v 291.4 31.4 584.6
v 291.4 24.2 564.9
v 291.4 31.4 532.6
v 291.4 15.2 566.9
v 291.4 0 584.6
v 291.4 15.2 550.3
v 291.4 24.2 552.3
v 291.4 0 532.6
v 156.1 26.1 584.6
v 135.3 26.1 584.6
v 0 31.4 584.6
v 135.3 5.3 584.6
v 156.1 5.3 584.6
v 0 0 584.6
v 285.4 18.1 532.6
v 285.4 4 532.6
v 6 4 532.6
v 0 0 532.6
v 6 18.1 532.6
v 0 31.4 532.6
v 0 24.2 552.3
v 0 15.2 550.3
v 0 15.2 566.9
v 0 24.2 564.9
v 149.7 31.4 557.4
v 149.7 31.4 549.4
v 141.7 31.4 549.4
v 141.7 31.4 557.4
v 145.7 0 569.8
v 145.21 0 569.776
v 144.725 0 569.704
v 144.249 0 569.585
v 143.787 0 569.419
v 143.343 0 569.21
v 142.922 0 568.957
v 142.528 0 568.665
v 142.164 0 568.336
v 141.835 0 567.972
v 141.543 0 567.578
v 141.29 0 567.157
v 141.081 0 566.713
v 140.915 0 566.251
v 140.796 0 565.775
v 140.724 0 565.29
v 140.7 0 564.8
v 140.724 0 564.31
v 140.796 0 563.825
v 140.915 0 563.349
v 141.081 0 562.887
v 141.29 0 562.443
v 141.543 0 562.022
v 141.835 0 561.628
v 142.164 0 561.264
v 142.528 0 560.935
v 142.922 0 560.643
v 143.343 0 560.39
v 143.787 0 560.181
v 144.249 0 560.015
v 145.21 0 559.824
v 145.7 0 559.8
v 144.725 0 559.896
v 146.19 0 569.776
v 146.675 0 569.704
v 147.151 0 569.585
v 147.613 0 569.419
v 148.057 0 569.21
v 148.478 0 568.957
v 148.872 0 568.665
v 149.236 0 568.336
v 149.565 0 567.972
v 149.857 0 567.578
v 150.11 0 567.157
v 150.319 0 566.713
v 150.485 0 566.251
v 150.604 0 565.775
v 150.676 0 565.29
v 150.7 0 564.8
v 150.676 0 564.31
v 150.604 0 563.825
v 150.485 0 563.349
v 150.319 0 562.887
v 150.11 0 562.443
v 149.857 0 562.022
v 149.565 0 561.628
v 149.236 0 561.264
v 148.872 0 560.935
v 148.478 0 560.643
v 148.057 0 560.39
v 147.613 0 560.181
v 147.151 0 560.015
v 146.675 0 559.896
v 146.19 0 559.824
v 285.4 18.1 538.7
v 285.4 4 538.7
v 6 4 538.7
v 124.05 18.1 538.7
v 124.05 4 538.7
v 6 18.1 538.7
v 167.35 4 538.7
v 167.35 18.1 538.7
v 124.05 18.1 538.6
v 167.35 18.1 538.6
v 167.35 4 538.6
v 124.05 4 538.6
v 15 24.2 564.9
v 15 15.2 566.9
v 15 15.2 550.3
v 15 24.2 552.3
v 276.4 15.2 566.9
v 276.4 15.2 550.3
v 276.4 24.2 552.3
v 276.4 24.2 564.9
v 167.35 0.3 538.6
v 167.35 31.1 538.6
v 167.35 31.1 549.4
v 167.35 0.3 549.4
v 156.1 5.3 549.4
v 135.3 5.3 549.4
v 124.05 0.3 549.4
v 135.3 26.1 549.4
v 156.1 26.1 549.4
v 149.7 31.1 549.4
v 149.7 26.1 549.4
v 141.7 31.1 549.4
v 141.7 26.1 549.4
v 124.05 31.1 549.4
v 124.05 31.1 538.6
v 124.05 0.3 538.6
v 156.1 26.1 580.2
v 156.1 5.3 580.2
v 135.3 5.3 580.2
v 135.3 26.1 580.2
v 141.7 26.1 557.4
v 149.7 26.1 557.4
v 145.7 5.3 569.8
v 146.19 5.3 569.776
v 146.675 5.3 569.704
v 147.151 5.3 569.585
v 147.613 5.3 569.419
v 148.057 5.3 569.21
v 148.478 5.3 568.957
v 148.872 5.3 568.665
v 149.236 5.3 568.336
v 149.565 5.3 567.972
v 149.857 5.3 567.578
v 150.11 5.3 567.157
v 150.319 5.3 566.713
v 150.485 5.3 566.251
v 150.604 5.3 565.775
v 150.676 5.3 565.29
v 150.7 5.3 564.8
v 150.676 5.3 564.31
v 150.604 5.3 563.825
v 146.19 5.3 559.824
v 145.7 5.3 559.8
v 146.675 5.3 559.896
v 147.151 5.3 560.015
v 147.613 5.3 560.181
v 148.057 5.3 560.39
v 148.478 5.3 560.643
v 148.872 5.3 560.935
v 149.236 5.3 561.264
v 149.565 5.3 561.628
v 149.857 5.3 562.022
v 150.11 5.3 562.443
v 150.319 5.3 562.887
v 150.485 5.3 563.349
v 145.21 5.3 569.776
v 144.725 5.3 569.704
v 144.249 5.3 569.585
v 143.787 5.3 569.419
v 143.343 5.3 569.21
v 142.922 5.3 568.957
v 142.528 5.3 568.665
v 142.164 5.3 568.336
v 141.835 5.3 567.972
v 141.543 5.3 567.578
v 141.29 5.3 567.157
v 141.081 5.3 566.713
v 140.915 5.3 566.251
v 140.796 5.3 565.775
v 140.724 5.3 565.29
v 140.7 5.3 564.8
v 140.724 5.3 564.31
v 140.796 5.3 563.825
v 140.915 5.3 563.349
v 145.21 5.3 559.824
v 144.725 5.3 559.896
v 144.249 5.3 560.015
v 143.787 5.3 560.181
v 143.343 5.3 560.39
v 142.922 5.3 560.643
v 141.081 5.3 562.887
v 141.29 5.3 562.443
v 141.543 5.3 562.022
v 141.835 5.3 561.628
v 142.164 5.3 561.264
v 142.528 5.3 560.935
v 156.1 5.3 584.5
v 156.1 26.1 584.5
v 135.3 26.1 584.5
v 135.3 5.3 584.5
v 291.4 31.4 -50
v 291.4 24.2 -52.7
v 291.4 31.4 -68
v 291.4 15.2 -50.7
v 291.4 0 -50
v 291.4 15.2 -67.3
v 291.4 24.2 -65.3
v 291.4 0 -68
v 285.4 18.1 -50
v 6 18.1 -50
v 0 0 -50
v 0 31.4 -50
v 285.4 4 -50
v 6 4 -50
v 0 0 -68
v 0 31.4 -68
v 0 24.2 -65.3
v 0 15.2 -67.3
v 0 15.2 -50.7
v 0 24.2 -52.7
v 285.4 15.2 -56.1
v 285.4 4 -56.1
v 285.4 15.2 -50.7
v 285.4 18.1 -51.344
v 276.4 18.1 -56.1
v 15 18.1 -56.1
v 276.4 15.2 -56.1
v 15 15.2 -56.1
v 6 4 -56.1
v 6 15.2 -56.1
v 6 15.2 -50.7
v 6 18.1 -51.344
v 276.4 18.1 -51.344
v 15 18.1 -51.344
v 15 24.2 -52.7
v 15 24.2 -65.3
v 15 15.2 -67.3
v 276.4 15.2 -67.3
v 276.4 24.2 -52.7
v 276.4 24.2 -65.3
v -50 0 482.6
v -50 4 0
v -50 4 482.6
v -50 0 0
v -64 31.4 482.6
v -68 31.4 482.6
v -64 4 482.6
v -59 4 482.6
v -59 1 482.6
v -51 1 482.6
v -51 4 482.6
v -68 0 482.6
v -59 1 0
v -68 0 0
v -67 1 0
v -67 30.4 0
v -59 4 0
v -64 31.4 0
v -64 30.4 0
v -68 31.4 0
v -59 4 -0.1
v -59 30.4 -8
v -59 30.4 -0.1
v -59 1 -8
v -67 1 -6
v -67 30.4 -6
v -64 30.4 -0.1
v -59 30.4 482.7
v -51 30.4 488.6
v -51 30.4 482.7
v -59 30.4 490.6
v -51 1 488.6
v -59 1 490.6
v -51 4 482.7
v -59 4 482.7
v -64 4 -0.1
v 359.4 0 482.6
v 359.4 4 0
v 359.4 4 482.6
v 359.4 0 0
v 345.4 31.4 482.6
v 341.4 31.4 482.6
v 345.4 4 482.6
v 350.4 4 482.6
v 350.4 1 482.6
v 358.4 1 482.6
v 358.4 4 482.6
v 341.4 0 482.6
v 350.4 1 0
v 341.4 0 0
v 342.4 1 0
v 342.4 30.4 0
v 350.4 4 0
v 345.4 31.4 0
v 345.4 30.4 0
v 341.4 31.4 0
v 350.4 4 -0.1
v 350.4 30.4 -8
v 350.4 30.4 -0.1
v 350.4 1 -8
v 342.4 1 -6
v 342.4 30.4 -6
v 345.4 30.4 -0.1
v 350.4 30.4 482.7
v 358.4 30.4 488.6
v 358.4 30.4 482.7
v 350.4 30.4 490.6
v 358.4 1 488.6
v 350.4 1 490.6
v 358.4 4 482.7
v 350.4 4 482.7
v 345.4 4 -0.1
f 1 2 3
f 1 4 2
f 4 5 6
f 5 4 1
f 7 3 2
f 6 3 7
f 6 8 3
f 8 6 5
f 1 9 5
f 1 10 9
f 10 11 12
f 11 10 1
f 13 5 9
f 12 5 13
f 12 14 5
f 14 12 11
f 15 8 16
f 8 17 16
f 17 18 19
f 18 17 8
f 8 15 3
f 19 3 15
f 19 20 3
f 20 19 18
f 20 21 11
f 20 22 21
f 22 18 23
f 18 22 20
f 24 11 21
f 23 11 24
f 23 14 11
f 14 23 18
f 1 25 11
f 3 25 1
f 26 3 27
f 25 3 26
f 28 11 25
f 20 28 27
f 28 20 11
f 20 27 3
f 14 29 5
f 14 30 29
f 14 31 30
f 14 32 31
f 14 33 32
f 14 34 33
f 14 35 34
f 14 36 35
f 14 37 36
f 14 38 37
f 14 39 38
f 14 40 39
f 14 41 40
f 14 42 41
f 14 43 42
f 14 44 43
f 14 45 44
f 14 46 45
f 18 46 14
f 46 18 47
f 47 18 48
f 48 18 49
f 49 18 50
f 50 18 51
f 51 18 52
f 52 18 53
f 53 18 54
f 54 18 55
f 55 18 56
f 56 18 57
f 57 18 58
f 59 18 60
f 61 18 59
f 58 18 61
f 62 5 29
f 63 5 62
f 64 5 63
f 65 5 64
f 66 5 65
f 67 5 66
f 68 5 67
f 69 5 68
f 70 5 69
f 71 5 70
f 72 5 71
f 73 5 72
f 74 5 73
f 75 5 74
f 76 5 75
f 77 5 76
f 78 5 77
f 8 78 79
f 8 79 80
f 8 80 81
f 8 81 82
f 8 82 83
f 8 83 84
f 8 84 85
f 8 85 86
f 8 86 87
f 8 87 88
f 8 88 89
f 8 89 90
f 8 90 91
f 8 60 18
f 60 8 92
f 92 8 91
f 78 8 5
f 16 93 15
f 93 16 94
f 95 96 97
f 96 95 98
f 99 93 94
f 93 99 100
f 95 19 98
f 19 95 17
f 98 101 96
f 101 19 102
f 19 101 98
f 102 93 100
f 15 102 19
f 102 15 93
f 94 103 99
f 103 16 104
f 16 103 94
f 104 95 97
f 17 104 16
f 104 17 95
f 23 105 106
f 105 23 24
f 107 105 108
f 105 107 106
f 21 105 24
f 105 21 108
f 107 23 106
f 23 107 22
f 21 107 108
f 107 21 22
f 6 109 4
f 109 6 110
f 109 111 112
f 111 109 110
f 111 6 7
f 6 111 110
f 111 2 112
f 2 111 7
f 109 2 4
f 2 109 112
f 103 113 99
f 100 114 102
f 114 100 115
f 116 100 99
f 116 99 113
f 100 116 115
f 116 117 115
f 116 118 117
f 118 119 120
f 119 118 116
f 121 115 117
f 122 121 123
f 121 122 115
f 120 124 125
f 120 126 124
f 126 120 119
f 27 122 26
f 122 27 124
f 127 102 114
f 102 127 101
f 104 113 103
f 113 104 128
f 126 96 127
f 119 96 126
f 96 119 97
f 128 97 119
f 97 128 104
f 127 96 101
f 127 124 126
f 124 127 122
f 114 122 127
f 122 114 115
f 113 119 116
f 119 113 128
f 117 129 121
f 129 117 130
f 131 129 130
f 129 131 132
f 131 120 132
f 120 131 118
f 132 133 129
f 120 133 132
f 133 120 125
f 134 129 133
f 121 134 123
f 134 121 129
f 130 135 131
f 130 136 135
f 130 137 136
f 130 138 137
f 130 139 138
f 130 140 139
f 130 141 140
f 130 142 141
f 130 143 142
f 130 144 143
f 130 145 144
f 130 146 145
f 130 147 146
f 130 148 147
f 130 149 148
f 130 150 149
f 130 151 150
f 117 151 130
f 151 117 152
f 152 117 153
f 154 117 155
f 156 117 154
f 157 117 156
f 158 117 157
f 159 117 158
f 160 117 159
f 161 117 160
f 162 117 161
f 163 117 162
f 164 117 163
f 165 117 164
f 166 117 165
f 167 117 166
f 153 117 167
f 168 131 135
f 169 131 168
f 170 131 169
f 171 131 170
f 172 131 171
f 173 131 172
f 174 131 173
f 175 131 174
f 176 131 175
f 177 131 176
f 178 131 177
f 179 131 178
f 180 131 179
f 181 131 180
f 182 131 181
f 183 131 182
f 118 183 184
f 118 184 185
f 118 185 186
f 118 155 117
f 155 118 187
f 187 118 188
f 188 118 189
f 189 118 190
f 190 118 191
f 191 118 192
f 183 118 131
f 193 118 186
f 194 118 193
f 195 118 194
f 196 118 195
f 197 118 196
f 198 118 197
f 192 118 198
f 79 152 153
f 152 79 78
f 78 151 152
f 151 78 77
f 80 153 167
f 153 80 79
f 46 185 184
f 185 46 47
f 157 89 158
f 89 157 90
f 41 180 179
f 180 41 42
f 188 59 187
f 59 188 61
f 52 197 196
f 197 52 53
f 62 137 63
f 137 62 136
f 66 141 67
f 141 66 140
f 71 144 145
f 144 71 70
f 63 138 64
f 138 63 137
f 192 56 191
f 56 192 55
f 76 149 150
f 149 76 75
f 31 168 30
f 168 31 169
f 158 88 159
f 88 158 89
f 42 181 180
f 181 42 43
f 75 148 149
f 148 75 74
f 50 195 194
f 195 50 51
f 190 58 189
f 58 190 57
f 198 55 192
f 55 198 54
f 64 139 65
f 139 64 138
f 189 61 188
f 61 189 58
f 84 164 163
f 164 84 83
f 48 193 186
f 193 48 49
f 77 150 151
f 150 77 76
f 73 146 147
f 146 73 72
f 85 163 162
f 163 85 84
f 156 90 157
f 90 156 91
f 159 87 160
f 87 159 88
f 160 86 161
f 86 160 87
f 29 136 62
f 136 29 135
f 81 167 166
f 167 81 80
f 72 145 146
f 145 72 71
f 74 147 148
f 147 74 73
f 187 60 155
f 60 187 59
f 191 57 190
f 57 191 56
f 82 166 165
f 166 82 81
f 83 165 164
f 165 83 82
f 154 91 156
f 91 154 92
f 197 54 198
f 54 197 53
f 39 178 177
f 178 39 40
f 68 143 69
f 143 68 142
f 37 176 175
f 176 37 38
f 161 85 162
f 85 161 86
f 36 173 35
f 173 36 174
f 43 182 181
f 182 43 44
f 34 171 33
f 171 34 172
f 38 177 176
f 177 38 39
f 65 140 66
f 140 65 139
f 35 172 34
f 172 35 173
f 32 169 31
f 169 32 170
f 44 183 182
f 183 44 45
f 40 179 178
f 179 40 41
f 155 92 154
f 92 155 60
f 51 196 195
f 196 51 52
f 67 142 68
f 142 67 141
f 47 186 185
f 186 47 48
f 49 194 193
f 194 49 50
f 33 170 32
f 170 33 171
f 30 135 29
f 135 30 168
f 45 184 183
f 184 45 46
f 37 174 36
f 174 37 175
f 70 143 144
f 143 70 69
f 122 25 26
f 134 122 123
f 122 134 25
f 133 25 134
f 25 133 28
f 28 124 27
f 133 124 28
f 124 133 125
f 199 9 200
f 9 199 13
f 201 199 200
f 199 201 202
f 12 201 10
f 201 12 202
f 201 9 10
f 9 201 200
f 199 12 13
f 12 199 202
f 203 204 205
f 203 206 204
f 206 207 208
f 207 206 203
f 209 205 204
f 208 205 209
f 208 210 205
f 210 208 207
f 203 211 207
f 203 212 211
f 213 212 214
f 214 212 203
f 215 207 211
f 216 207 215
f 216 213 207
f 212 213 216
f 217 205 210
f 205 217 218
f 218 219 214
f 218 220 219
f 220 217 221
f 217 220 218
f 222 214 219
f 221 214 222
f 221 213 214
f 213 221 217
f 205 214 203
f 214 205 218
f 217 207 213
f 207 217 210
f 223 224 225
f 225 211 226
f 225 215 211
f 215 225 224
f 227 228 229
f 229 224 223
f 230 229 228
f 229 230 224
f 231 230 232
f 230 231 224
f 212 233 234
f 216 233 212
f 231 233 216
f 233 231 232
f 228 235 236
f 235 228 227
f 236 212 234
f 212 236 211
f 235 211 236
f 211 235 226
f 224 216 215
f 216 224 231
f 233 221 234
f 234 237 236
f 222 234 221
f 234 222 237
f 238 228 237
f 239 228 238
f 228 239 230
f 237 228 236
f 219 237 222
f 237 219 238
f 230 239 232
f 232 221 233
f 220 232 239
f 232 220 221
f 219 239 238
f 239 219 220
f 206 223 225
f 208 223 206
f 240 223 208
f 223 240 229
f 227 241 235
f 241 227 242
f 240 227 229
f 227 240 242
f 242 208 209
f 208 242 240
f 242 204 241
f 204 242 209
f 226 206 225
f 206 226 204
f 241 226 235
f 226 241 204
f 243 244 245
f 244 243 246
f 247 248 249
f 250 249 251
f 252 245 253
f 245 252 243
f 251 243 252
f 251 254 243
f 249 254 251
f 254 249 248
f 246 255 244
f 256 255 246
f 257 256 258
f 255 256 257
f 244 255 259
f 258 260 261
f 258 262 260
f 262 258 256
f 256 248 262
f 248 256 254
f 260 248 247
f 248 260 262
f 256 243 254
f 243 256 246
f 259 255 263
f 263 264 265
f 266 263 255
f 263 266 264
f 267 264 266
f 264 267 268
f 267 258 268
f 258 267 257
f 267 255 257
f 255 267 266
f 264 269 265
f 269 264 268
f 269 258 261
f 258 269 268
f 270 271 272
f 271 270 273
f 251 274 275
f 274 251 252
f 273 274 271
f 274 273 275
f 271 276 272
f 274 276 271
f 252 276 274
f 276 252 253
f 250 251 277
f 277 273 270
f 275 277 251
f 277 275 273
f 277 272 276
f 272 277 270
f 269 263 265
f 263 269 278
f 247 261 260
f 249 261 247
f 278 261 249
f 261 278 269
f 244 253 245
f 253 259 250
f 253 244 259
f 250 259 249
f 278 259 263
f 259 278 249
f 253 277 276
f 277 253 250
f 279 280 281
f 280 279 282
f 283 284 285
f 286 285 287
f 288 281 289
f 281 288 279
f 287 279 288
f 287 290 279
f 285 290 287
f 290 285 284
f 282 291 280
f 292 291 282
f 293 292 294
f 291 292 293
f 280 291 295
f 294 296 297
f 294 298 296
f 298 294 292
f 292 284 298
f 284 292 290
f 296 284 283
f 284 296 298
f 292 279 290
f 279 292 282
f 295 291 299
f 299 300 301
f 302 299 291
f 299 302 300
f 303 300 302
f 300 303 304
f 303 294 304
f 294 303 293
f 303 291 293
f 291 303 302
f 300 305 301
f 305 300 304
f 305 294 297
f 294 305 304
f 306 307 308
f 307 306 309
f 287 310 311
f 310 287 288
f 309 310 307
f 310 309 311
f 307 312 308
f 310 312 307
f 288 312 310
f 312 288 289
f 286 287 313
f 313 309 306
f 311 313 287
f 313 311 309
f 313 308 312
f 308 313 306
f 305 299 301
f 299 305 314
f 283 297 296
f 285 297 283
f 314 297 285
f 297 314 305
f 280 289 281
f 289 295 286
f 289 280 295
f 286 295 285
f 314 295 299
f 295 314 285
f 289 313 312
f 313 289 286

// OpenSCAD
// ============================================================
//  SMART MIRROR FRAME  –  4-piece snap-together  (PORTRAIT)
//
//  Monitor physical size : 19" x 11" x 1"
//    → 482.6 mm tall  (MON_H, vertical / long side)
//    → 279.4 mm wide  (MON_W, horizontal / short side)
//    → 25.4  mm deep  (MON_D)
//
//  Portrait orientation:
//    TOP  & BOTTOM rails  = SHORT  (span the 279.4 mm width)
//    LEFT & RIGHT  rails  = TALL   (span the 482.6 mm height)
//    Corner joints: TALL side rails carry TABS,
//                   SHORT top/bottom rails carry SOCKETS.
//
//  Camera : Logitech 101  (fully embedded in short top rail)
//    stand  : 42.5 x 30 x 10 mm
//    body   : 20  x 20 x 30 mm  (lens faces mirror front / -Y)
//
//  PARTS  →  set PART below, then render / export each STL:
//    "top"    short top rail  (embedded camera, lens port, cable exit)
//    "bottom" short bottom rail
//    "left"   tall left rail
//    "right"  tall right rail  (identical to left, print 2)
//    "all"    exploded view
// ============================================================

PART = "all";   // ← change to "top" / "bottom" / "left" / "right"

// ----------------------------------------------------------
//  MONITOR DIMENSIONS
// ----------------------------------------------------------
MON_W = 279.4;   // short side – width  (X)
MON_H = 482.6;   // long  side – height (Y / portrait axis)
MON_D =  25.4;   // depth (Z)

// ----------------------------------------------------------
//  FRAME PROFILE  (same cross-section on all four rails)
// ----------------------------------------------------------
WALL   = 6;            // outer wall / skin thickness
LIP    = 8;            // rear flange depth that tucks behind monitor
REVEAL = 4;            // front bezel overlap over monitor face
DEPTH  = MON_D + WALL; // full channel depth ≈ 31.4 mm

// ----------------------------------------------------------
//  DOVETAIL SNAP JOINT GEOMETRY
// ----------------------------------------------------------
TAB_W  = 16;           // base width of dovetail
TAB_H  =  8;           // protrusion length
TAB_T  = DEPTH - 2;    // thickness (nearly full depth)
DRAFT  =  2;           // taper on each side
CLEAR  =  0.3;         // fit clearance (tighten to 0.2 for resin)

// ----------------------------------------------------------
//  CAMERA DIMENSIONS  (Logitech 101)
// ----------------------------------------------------------
CAM_SL  = 42.5;   // stand length (X)
CAM_SW  = 30.0;   // stand width  (Y, front-to-back)
CAM_SH  = 10.0;   // stand height (Z)

CAM_BL  = 20.0;   // body length  (X)
CAM_BW  = 20.0;   // body width   (Y)
CAM_BH  = 30.0;   // body height  (Z)

CAM_CLR =  0.4;   // cavity clearance on all faces
LENS_D  = 10.0;   // lens port diameter
CABLE_W =  8.0;   // USB cable channel width

// Top rail Z-height must accommodate camera stack + wall skins
CAM_STACK  = CAM_SH + CAM_BH;          // 40 mm
TOP_RAIL_H = CAM_STACK + 2*WALL;       // 52 mm

// Normal short-rail height (bottom rail uses this)
SHORT_H    = WALL + LIP + REVEAL;      // 18 mm

// ============================================================
//  dovetail_tab()
//  Positive shape. Protrusion points in +X at call site;
//  caller rotates as needed.
// ============================================================
module dovetail_tab() {
    linear_extrude(TAB_T, center=true)
    polygon([
        [ 0,       -(TAB_W/2)        ],
        [ 0,        (TAB_W/2)        ],
        [ TAB_H,    (TAB_W/2 - DRAFT)],
        [ TAB_H,   -(TAB_W/2 - DRAFT)]
    ]);
}

// ============================================================
//  dovetail_socket()
//  Negative shape (subtract). Same profile + CLEAR.
// ============================================================
module dovetail_socket() {
    c = CLEAR;
    linear_extrude(TAB_T + 2*c, center=true)
    polygon([
        [-0.5,      -(TAB_W/2 + c)        ],
        [-0.5,       (TAB_W/2 + c)        ],
        [ TAB_H+0.5, (TAB_W/2 - DRAFT + c)],
        [ TAB_H+0.5,-(TAB_W/2 - DRAFT + c)]
    ]);
}

// ============================================================
//  TOP RAIL  (short, camera embedded)
//
//  Axes in this module:
//    X  = rail length  (0 … MON_W + 2*WALL)
//    Y  = front-to-back (0 = mirror front face)
//    Z  = rail height   (0 = inner bottom edge, TOP_RAIL_H = top)
//
//  - Monitor slot opens on bottom face (Z≈0), full X width
//  - Dovetail SOCKETS at each X end  (tab from side rail slides in)
//  - Camera stand cavity at Z=WALL (just above inner bottom skin)
//  - Camera body cavity stacked above stand cavity
//  - Lens port Ø LENS_D punched through front face (Y=0)
//  - Cable channel exits rear face (Y=DEPTH)
//  - Top-face access slot so camera can be dropped in during build
// ============================================================
module top_rail() {
    L = MON_W + 2*WALL;   // 291.4 mm

    // Camera X centre (centred in rail)
    cx = L / 2;

    // Stand cavity
    sx0 = cx - (CAM_SL + 2*CAM_CLR) / 2;
    sy0 = (DEPTH - (CAM_SW + 2*CAM_CLR)) / 2;
    sz0 = WALL;

    // Body cavity (centred on stand in X and Y, sits on top of stand)
    bx0 = cx - (CAM_BL + 2*CAM_CLR) / 2;
    by0 = (DEPTH - (CAM_BW + 2*CAM_CLR)) / 2;
    bz0 = sz0 + CAM_SH + 2*CAM_CLR;

    // Lens port Z centre (mid-height of body cavity)
    lens_z = bz0 + (CAM_BH + 2*CAM_CLR) / 2;

    difference() {
        // ---- solid rail block ----
        cube([L, DEPTH, TOP_RAIL_H]);

        // ---- monitor slot – bottom face ----
        translate([WALL, REVEAL, -0.1])
        cube([MON_W, LIP + WALL + 0.1, WALL + 0.2]);

        // ---- dovetail socket – left end (X=0, opens in -X) ----
        translate([0, DEPTH/2, TOP_RAIL_H/2])
        rotate([0, 90, 0])   // protrusion now points in -X (into socket opening)
        rotate([0,  0, 90])
        dovetail_socket();

        // ---- dovetail socket – right end (X=L, opens in +X) ----
        translate([L, DEPTH/2, TOP_RAIL_H/2])
        rotate([0, -90, 0])
        rotate([0,   0, 90])
        dovetail_socket();

        // ---- stand cavity ----
        translate([sx0, sy0, sz0])
        cube([CAM_SL + 2*CAM_CLR,
              CAM_SW + 2*CAM_CLR,
              CAM_SH + 2*CAM_CLR]);

        // ---- body cavity ----
        translate([bx0, by0, bz0])
        cube([CAM_BL + 2*CAM_CLR,
              CAM_BW + 2*CAM_CLR,
              CAM_BH + 2*CAM_CLR]);

        // ---- lens port (through front face Y=0) ----
        translate([cx, -0.1, lens_z])
        rotate([-90, 0, 0])
        cylinder(h = WALL + 1, r = LENS_D/2, $fn = 64);

        // ---- cable channel (exits rear face Y=DEPTH) ----
        translate([(L - CABLE_W)/2, DEPTH - WALL - 0.1, bz0])
        cube([CABLE_W, WALL + 0.2, CABLE_W]);

        // ---- top access slot for drop-in camera assembly ----
        translate([bx0, by0, TOP_RAIL_H - 0.1])
        cube([CAM_BL + 2*CAM_CLR,
              CAM_BW + 2*CAM_CLR,
              WALL + 0.2]);
    }
}

// ============================================================
//  BOTTOM RAIL  (short, no camera)
//
//  Same X/Y layout as top rail; shorter Z (SHORT_H = 18 mm).
//  Monitor slot opens on TOP face (Z = SHORT_H).
// ============================================================
module bottom_rail() {
    L = MON_W + 2*WALL;

    difference() {
        cube([L, DEPTH, SHORT_H]);

        // ---- monitor slot – top face ----
        translate([WALL, REVEAL, SHORT_H - WALL - 0.1])
        cube([MON_W, LIP + WALL + 0.1, WALL + 0.2]);

        // ---- dovetail socket – left end ----
        translate([0, DEPTH/2, SHORT_H/2])
        rotate([0, 90, 0])
        rotate([0,  0, 90])
        dovetail_socket();

        // ---- dovetail socket – right end ----
        translate([L, DEPTH/2, SHORT_H/2])
        rotate([0, -90, 0])
        rotate([0,   0, 90])
        dovetail_socket();
    }
}

// ============================================================
//  SIDE RAIL  (tall – left or right, print 2)
//
//  Axes:
//    X  = rail cross-section width  (WALL + LIP + REVEAL)
//    Y  = front-to-back (0 = front face)
//    Z  = height  (0 … MON_H = 482.6 mm)
//
//  - Monitor slot opens on interior face (X = WALL+LIP+REVEAL)
//  - Dovetail TABS at Z=0 (bottom, pointing down) and
//    Z=MON_H (top, pointing up)
//    → tabs slide into the sockets of the short rails
// ============================================================
module side_rail() {
    RW = WALL + LIP + REVEAL;   // cross-section width ≈ 18 mm

    difference() {
        union() {
            // ---- rail body ----
            cube([RW, DEPTH, MON_H]);

            // ---- dovetail tab – bottom end (points in -Z) ----
            translate([RW/2, DEPTH/2, 0])
            rotate([0, 180, 0])   // flip so protrusion goes -Z
            rotate([90, 0, 0])
            dovetail_tab();

            // ---- dovetail tab – top end (points in +Z) ----
            translate([RW/2, DEPTH/2, MON_H])
            rotate([90, 0, 0])
            dovetail_tab();
        }

        // ---- monitor slot (interior face) ----
        translate([REVEAL, REVEAL, -0.1])
        cube([LIP + WALL + 0.1, DEPTH - REVEAL, MON_H + 0.2]);
    }
}

// ============================================================
//  EXPLODED VIEW
// ============================================================
module all_parts() {
    g  = 50;   // gap between parts
    RW = WALL + LIP + REVEAL;

    // top rail – above
    translate([0, 0, MON_H + g])
    top_rail();

    // bottom rail – below
    translate([0, 0, -(SHORT_H + g)])
    bottom_rail();

    // left side rail
    translate([-(RW + g), 0, 0])
    side_rail();

    // right side rail
    translate([MON_W + 2*WALL + g, 0, 0])
    side_rail();
}

// ============================================================
//  RENDER
// ============================================================
if      (PART == "top")    top_rail();
else if (PART == "bottom") bottom_rail();
else if (PART == "left")   side_rail();
else if (PART == "right")  side_rail();
else                       all_parts();
